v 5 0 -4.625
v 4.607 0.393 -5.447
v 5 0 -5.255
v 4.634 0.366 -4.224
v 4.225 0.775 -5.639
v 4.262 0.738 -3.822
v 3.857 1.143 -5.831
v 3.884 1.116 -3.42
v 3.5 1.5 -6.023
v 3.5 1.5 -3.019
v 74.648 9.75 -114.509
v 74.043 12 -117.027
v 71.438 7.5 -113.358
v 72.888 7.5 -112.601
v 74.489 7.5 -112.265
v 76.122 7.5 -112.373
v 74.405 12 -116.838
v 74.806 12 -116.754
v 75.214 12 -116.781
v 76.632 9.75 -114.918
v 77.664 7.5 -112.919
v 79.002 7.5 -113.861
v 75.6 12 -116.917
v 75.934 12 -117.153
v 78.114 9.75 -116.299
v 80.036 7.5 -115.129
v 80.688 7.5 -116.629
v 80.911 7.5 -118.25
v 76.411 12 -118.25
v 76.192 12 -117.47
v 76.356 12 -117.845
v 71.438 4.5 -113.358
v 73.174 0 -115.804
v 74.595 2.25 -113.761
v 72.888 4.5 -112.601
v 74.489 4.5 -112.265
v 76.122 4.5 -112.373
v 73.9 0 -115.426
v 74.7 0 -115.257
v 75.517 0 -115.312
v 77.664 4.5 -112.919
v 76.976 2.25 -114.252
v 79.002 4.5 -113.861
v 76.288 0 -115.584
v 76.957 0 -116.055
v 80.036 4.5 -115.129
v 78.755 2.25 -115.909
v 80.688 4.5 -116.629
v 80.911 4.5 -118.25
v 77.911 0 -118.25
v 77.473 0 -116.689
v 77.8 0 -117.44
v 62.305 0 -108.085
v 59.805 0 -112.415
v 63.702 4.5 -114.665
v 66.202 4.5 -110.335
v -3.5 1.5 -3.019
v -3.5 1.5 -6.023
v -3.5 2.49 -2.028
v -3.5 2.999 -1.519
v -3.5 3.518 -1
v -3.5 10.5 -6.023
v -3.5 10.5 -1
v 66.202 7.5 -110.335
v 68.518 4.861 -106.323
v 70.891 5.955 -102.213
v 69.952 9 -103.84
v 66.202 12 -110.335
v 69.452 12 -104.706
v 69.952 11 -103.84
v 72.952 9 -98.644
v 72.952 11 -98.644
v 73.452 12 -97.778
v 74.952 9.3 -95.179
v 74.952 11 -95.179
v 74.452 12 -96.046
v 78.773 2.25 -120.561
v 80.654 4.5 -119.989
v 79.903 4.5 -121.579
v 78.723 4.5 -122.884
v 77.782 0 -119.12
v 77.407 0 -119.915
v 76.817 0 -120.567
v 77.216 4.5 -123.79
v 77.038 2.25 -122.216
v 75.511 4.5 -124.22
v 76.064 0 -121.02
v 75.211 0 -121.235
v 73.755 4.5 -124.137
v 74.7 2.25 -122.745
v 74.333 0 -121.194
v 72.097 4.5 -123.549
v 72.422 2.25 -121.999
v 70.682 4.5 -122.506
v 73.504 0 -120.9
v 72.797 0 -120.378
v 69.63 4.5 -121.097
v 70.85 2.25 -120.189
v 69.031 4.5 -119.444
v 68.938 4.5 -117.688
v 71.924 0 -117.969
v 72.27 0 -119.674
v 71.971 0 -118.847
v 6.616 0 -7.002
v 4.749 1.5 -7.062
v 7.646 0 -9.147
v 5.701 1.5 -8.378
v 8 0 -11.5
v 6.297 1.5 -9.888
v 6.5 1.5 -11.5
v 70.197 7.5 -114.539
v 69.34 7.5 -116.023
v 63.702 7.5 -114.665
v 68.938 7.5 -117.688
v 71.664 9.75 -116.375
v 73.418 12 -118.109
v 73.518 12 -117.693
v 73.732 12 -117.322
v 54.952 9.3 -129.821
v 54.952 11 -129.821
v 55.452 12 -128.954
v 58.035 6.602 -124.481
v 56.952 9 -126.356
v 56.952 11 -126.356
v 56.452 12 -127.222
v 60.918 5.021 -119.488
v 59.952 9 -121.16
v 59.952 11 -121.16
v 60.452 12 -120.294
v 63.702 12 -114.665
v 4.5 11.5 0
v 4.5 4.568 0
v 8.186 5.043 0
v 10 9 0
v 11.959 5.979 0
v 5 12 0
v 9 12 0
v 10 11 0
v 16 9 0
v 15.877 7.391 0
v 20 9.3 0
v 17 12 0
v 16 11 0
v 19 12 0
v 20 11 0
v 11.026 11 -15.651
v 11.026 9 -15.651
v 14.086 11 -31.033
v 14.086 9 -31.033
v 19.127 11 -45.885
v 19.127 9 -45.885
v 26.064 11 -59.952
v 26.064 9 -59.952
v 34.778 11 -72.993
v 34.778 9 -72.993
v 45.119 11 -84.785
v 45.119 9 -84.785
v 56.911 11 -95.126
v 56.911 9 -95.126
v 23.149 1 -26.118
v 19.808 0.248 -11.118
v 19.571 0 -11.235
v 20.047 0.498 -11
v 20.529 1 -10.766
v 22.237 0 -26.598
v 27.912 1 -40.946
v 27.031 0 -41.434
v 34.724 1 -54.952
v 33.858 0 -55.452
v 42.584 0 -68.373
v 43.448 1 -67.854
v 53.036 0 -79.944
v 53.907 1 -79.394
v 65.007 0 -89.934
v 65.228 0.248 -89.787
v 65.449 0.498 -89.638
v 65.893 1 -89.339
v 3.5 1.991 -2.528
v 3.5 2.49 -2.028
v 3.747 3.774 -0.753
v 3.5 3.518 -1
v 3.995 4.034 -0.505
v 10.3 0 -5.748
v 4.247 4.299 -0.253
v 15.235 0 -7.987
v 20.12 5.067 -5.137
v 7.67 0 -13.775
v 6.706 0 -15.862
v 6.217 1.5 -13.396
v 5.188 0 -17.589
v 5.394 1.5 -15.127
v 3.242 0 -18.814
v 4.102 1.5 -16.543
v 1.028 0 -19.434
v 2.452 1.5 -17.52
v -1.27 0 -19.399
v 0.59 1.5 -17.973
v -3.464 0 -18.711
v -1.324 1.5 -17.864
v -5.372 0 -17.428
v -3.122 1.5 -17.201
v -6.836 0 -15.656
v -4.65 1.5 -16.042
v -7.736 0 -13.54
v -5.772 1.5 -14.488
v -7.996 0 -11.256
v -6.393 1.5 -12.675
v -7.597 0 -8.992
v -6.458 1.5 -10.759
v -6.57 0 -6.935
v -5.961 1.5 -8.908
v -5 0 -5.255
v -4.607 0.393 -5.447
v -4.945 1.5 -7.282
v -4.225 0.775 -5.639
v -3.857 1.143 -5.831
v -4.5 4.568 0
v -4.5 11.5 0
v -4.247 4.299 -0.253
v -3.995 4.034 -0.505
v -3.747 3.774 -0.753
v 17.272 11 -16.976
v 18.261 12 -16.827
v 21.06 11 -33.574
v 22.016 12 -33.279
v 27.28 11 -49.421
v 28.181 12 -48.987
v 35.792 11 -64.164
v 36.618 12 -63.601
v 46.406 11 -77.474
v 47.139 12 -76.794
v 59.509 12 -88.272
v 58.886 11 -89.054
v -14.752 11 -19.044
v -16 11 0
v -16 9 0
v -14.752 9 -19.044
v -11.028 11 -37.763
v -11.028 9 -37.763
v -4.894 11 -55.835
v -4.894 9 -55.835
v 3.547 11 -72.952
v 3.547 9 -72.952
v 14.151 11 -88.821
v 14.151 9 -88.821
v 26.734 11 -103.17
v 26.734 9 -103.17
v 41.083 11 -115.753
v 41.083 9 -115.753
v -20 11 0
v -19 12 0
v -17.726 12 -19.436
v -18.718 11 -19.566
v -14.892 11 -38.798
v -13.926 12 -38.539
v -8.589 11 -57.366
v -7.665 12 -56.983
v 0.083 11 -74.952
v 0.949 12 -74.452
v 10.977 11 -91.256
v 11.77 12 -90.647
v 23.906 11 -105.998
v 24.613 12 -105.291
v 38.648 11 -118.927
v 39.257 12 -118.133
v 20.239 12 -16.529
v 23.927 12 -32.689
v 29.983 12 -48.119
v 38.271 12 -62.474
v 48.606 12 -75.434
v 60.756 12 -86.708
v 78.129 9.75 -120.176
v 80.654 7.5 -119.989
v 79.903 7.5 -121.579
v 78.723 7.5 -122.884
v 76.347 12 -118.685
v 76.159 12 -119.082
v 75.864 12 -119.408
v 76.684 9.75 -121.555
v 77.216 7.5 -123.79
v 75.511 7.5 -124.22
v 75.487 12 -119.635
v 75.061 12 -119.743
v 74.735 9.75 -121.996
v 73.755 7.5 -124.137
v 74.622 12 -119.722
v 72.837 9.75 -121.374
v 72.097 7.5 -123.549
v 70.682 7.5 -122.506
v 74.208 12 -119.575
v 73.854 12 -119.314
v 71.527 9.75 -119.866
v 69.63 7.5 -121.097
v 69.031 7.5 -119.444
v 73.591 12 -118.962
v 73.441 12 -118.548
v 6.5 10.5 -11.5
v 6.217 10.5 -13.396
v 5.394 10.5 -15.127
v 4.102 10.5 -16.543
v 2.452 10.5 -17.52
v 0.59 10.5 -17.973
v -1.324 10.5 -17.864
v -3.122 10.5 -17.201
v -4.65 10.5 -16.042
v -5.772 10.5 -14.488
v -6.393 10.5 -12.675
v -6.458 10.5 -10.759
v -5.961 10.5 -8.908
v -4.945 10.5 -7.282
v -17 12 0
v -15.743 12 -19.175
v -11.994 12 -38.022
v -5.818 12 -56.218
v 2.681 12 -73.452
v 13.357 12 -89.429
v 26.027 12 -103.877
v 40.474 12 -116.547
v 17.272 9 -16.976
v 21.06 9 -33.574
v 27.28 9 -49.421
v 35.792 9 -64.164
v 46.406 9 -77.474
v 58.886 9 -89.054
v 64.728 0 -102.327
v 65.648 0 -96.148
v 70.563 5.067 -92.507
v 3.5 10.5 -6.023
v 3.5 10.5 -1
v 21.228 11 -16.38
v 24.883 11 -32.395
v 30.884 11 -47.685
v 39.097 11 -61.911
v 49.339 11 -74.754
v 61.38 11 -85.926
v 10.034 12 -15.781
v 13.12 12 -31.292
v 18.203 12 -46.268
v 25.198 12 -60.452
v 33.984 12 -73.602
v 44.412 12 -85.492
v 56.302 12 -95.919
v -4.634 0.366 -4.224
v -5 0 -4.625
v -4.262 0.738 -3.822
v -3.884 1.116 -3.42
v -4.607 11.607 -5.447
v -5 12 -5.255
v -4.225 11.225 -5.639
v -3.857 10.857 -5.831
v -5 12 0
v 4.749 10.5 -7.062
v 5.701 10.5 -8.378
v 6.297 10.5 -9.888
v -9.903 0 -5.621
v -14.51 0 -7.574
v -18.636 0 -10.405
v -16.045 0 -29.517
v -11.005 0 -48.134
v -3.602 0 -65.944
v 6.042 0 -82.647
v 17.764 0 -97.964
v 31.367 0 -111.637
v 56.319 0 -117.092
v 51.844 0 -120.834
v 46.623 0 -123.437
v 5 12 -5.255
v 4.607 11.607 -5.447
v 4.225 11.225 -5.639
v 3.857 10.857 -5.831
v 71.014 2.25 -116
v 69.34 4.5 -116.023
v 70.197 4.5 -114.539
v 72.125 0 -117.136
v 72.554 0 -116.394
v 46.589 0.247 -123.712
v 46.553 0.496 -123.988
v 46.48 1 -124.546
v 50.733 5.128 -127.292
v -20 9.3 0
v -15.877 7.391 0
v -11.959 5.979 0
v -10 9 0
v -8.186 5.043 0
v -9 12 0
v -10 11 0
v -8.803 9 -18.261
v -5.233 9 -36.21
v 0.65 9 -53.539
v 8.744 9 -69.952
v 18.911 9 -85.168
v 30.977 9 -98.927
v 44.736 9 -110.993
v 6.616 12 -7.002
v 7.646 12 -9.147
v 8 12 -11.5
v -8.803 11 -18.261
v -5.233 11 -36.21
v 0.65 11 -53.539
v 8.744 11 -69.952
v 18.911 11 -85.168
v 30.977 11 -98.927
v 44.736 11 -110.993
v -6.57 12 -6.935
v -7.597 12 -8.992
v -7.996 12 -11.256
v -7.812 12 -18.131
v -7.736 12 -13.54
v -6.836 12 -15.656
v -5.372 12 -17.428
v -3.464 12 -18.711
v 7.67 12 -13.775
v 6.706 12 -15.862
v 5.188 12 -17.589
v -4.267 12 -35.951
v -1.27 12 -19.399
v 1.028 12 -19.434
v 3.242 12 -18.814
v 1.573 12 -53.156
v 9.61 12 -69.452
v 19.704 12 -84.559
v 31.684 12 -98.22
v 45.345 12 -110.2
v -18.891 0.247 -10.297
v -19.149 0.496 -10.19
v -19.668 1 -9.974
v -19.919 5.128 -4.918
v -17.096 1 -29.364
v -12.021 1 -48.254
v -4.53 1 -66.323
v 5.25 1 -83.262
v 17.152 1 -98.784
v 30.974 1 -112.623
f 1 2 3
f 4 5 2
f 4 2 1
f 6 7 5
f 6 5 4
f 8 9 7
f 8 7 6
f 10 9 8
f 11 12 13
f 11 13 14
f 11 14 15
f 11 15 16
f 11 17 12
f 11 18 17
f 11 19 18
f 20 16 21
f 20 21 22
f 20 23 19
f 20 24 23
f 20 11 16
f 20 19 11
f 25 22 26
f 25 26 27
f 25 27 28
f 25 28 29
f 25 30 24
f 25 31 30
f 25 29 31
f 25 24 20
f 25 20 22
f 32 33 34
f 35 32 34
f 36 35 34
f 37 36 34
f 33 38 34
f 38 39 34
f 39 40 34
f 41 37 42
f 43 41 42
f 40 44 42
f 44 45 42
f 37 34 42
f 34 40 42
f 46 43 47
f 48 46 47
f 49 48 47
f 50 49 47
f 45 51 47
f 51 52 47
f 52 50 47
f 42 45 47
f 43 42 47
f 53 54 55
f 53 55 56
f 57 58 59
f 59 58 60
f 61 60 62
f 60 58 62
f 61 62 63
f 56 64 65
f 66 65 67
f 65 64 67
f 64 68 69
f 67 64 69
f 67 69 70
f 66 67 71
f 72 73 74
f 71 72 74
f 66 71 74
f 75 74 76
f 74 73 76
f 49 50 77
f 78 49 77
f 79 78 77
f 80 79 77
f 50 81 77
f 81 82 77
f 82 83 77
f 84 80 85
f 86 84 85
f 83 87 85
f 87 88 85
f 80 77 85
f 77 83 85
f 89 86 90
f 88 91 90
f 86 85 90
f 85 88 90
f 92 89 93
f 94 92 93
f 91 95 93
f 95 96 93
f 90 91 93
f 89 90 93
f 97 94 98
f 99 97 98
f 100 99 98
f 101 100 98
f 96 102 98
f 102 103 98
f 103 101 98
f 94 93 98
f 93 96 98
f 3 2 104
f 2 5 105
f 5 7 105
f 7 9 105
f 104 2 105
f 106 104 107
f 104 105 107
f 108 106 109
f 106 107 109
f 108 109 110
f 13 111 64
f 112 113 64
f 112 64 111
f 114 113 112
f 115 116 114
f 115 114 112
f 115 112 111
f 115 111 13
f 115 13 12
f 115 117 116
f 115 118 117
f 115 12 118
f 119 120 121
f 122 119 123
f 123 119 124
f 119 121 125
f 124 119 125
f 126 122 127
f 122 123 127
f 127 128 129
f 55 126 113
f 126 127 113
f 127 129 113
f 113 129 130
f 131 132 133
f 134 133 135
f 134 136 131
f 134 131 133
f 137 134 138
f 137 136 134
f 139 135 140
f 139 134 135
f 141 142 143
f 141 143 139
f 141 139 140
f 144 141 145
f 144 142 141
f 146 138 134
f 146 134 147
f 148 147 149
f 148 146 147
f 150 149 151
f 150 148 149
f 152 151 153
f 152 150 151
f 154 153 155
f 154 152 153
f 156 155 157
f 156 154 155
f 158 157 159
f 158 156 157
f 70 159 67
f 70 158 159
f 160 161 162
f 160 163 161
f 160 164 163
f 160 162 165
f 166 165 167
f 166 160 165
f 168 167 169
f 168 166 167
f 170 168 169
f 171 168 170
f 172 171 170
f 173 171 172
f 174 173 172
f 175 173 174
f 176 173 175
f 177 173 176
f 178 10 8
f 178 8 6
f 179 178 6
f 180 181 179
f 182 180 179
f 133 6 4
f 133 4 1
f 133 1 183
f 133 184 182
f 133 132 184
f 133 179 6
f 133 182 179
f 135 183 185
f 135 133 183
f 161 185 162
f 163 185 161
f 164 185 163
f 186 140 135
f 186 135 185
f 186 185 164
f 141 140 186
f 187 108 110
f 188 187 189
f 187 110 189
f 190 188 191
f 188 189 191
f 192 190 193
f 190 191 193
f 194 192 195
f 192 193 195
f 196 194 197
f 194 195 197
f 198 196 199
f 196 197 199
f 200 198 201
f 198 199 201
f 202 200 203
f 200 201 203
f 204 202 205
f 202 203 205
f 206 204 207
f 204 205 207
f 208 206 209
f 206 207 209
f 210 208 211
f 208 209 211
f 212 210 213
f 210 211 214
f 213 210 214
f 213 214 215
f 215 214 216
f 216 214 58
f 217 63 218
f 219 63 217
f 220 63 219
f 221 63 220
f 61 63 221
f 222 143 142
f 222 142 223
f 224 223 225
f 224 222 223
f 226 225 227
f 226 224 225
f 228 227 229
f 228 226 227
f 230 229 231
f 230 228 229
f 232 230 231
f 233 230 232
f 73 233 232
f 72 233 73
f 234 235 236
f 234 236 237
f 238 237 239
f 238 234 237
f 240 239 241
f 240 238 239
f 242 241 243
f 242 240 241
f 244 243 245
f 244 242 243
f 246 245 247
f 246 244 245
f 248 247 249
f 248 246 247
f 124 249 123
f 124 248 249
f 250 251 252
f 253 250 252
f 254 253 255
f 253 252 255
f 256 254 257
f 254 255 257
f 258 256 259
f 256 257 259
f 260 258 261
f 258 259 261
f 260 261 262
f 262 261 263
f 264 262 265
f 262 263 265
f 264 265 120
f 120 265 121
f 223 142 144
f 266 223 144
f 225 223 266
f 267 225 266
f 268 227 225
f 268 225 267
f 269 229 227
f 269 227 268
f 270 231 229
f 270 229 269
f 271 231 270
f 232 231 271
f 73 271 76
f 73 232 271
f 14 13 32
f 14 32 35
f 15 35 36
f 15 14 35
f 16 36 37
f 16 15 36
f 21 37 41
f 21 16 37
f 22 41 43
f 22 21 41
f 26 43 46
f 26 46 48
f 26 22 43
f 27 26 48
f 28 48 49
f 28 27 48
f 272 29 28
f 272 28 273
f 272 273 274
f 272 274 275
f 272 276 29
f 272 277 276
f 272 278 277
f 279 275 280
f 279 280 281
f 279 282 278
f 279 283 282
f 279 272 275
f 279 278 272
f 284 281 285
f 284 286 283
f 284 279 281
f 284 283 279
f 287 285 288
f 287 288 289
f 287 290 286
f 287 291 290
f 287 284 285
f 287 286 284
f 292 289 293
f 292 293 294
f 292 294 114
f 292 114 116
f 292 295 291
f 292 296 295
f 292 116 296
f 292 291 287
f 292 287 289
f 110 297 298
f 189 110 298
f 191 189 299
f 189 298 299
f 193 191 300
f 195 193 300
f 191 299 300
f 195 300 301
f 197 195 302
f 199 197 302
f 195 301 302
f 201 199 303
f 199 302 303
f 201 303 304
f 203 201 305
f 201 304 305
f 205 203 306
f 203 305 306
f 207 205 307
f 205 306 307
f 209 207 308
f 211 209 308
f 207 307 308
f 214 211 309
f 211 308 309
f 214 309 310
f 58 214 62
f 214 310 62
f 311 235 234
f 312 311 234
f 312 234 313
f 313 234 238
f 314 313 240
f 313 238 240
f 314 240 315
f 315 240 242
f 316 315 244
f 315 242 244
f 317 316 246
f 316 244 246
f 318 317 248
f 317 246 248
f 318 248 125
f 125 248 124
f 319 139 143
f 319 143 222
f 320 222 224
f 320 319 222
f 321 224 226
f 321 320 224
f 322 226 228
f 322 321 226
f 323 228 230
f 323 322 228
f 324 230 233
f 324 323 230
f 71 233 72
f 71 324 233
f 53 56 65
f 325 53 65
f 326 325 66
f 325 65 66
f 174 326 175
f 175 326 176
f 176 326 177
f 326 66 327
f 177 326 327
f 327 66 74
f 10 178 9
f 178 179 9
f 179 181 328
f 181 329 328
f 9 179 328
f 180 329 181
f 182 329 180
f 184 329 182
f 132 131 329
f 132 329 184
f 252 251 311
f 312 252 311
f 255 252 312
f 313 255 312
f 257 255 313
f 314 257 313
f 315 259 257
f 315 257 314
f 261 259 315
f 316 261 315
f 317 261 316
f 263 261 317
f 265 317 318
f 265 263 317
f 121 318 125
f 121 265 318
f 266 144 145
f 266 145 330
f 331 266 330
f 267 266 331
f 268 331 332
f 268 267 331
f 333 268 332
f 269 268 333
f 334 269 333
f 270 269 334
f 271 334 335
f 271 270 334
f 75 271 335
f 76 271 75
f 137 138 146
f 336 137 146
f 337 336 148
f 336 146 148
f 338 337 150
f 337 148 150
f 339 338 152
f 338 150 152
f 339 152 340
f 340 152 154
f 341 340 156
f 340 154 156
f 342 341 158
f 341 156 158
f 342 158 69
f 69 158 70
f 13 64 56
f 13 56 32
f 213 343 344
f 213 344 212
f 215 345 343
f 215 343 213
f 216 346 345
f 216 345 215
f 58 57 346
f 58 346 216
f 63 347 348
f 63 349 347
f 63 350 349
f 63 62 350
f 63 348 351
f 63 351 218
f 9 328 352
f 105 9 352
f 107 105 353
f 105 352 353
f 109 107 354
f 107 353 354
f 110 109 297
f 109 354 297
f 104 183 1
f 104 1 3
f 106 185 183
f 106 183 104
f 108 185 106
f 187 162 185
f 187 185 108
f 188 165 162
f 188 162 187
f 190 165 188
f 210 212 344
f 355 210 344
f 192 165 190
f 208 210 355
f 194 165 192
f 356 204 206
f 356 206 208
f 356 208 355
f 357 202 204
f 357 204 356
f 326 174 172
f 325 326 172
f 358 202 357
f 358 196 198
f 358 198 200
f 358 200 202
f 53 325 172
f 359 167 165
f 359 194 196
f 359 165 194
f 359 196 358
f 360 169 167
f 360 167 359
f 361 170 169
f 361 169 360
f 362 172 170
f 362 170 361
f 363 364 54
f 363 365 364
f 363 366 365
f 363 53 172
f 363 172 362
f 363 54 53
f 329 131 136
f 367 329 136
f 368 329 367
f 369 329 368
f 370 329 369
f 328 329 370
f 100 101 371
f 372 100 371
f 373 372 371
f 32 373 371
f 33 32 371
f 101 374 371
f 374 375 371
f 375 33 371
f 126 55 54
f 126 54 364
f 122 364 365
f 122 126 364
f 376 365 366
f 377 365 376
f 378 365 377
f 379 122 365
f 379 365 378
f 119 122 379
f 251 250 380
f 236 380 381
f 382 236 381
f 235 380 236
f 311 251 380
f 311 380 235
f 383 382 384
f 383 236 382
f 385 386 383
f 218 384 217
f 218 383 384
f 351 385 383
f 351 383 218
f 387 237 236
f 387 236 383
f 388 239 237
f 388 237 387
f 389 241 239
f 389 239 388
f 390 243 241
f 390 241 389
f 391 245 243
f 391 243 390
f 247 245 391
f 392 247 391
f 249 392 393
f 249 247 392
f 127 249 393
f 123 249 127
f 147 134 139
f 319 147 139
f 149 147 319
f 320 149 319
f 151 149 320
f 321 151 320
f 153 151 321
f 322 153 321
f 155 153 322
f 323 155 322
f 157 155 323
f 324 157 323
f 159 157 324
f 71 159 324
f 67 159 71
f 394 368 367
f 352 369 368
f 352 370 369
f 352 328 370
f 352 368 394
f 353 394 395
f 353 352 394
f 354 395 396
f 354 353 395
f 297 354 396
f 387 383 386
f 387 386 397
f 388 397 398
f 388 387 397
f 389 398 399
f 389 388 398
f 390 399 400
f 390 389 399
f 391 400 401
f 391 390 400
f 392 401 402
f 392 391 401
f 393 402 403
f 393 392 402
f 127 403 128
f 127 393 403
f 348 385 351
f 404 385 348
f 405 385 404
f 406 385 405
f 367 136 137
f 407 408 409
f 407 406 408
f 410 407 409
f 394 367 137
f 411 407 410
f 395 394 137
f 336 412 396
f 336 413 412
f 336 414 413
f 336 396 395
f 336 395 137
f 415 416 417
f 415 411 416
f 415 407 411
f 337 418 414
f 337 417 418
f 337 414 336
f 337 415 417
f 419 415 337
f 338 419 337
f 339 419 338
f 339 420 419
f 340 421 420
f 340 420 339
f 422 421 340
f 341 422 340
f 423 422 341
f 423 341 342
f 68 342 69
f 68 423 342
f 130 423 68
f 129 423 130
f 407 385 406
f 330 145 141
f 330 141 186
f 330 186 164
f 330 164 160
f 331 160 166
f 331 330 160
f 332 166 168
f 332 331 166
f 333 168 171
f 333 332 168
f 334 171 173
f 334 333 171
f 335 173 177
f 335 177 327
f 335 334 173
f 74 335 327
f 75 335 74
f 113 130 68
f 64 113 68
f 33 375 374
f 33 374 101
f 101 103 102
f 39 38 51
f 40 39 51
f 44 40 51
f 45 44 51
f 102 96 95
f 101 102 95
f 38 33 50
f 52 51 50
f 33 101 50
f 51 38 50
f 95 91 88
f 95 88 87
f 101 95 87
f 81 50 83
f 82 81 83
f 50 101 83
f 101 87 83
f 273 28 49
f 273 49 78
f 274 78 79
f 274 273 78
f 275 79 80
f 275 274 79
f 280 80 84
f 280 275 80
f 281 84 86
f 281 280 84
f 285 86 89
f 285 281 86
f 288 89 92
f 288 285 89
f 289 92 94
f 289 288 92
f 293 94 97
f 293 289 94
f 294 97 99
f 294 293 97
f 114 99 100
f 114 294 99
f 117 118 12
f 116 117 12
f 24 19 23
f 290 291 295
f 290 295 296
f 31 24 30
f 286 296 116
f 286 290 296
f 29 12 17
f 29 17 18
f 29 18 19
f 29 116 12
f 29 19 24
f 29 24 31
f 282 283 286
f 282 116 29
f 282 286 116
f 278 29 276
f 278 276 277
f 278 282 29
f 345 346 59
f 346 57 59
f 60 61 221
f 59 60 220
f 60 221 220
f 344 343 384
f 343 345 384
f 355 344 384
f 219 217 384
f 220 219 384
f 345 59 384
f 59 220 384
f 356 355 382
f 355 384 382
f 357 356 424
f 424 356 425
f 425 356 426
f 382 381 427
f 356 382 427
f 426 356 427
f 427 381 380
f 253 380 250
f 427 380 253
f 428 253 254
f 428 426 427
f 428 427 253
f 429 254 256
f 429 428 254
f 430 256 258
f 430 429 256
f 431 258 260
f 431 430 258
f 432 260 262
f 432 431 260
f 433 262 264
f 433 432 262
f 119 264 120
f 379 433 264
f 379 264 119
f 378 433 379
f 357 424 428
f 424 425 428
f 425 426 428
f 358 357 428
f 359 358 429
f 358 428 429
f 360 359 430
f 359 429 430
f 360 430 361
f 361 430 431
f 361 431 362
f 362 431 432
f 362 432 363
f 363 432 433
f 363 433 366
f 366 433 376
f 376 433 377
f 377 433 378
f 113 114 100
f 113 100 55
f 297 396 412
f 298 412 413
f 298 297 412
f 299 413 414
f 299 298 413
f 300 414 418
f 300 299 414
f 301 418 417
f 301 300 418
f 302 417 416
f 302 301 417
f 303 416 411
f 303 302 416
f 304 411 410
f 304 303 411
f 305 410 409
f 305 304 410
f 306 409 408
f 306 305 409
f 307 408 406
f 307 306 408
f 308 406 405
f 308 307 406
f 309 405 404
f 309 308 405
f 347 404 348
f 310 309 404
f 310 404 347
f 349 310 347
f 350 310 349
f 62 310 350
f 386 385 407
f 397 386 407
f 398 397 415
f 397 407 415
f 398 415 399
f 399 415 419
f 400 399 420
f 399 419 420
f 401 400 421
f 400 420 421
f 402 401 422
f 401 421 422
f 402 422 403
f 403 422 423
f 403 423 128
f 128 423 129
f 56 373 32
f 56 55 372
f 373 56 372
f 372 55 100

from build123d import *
from build123d.topology import SkipClean

# Parameters (mm, degrees)
REVOLVE1_ANGLE       = 60
CUT_EXTRUDE1_DEPTH   = 151.38335158
BOSS_EXTRUDE1_DEPTH  = 12
BOSS_EXTRUDE2_DEPTH  = 7.5
CUT_EXTRUDE2_DEPTH   = 4.5
CHAMFER2_SIZE        = 4.5
CHAMFER5_SIZE2       = 3
CHAMFER5_SIZE        = 4.5
CHAMFER3_SIZE        = 1.5
CUT_REVOLVE1_ANGLE   = 90
CHAMFER4_SIZE        = 4.5
MIRROR4_COPY_1_ANGLE = 90
CHAMFER1_SIZE        = 1


with BuildPart() as part:
    # Sketch2 → Revolve1 (revolve)
    with BuildSketch(Plane.XY):
        Polygon((-16, 12), (-20, 12), (-20, 0), (20, 0), (20, 12), (16, 12), (16, 9), (10, 9), (10, 12), (-10, 12), (-10, 9), (-16, 9), align=None)
    revolve(axis=Axis((129.9038106, 0, 0), (0, -1, 0)), revolution_arc=REVOLVE1_ANGLE)

    # Sketch3 → Cut-Extrude1 (cut, through all)
    with BuildSketch(Plane(origin=(0, 12, 0), x_dir=(1, 0, 0), z_dir=(0, 1, 0))):
        with BuildLine():
            ThreePointArc((6.5, 11.5), (-3.122498999, 17.200877125), (-3.5, 6.022774425))
            Line((-3.5, 6.022774425), (-3.5, 11.5))
            Line((-3.5, 11.5), (3.5, 11.5))
            Line((3.5, 11.5), (3.5, 6.022774425))
            ThreePointArc((3.5, 6.022774425), (5.700877125, 8.377501001), (6.5, 11.5))
        make_face()
        with BuildLine():
            Line((-3.5, 11.5), (-3.5, 6.022774425))
            ThreePointArc((-3.5, 6.022774425), (0, 5), (3.5, 6.022774425))
            Line((3.5, 6.022774425), (3.5, 11.5))
            Line((3.5, 11.5), (-3.5, 11.5))
        make_face()
        with BuildLine():
            Line((-3.5, 6.022774425), (-3.5, 0))
            Line((-3.5, 0), (3.5, 0))
            Line((3.5, 0), (3.5, 6.022774425))
            ThreePointArc((3.5, 6.022774425), (0, 5), (-3.5, 6.022774425))
        make_face()
    extrude(amount=-CUT_EXTRUDE1_DEPTH, mode=Mode.SUBTRACT)



with BuildPart() as body_2:
    # Sketch4 → Boss-Extrude1 (new body)
    with BuildSketch(Plane(origin=(0, 12, 0), x_dir=(1, 0, 0), z_dir=(0, 1, 0))):
        with BuildLine():
            ThreePointArc((68.937586537, 117.687885509), (69.715045021, 115.250000028), (71.437586537, 113.35775849))
            Line((71.437586537, 113.35775849), (76.161197444, 116.084936519))
            Line((76.161197444, 116.084936519), (73.661197444, 120.415063537))
            Line((73.661197444, 120.415063537), (68.937586537, 117.687885509))
        make_face()
        with BuildLine():
            Line((76.161197444, 116.084936519), (71.437586537, 113.35775849))
            ThreePointArc((71.437586537, 113.35775849), (77.66422619, 112.918880753), (80.911197444, 118.250000028))
            ThreePointArc((80.911197444, 118.250000028), (74.629830638, 124.243399124), (68.937586537, 117.687885509))
            Line((68.937586537, 117.687885509), (73.661197444, 120.415063537))
            Line((73.661197444, 120.415063537), (76.161197444, 116.084936519))
        make_face()
    extrude(amount=-BOSS_EXTRUDE1_DEPTH)


with BuildPart() as part_1:
    add(part.part)

    add(body_2.part)  # Boss-Extrude2 merges body 2
    # Sketch4<3> → Boss-Extrude2 (add)
    with BuildSketch(Plane(origin=(0, 12, 0), x_dir=(1, 0, 0), z_dir=(0, 1, 0))):
        with BuildLine():
            Line((63.7019053, 114.665063537), (66.2019053, 110.334936519))
            Line((66.2019053, 110.334936519), (71.437586537, 113.35775849))
            ThreePointArc((71.437586537, 113.35775849), (69.715045021, 115.250000028), (68.937586537, 117.687885509))
            Line((68.937586537, 117.687885509), (63.7019053, 114.665063537))
        make_face()
    extrude(amount=-BOSS_EXTRUDE2_DEPTH)

    # Sketch4<5> → Cut-Extrude2 (cut)
    with SkipClean():  # the faces are left unmerged after this step: merging them gives an invalid solid
        with BuildSketch(Plane(origin=(0, 12, 0), x_dir=(1, 0, 0), z_dir=(0, 1, 0))):
            with BuildLine():
                Line((63.7019053, 114.665063537), (66.2019053, 110.334936519))
                Line((66.2019053, 110.334936519), (71.437586537, 113.35775849))
                ThreePointArc((71.437586537, 113.35775849), (69.715045021, 115.250000028), (68.937586537, 117.687885509))
                Line((68.937586537, 117.687885509), (63.7019053, 114.665063537))
            make_face()
        extrude(amount=-CUT_EXTRUDE2_DEPTH, mode=Mode.SUBTRACT)

    # Chamfer2
    chamfer2_edges = [part_1.edges().sort_by_distance(p)[0] for p in [
        (80.107349866, 12, -121.250000028),
    ]]
    chamfer(chamfer2_edges, length=CHAMFER2_SIZE - 0.0001)  # a hair under: the kernel refuses the full size

    # Chamfer5
    chamfer5_edges = [part_1.edges().sort_by_distance(p)[0] for p in [
        (80.88480835, 0, -118.812114547),
    ]]
    chamfer5_side = [part_1.faces().sort_by_distance(p)[0] for p in [
        (80.88480835, 0.06, -118.812114547),
    ]]
    chamfer(chamfer5_edges, length=CHAMFER5_SIZE - 0.0001, length2=CHAMFER5_SIZE2 - 0.0001, reference=chamfer5_side[0])  # a hair under: the kernel refuses the full size

    # Chamfer3
    chamfer3_edges = [part_1.edges().sort_by_distance(p)[0] for p in [
        (0, 0, -18),
        (3.5, 0, -3.011387212),
        (-3.5, 12, -3.011387212),
        (-3.5, 0, -3.011387212),
        (0, 12, -18),
        (3.5, 12, -3.011387212),
    ]]
    chamfer(chamfer3_edges, length=CHAMFER3_SIZE)

    # Sketch17 → Cut-Revolve1 (revolve, cut)
    with BuildSketch(Plane(origin=(-33.72595265, 0, -58.415063523), x_dir=(-0.8660254037844378, 0, 0.5000000000000017), z_dir=(-0.5000000000000016, -1.1564823173178769e-15, -0.8660254037844377))):
        Polygon((-118.545643971, 10.545643943), (-118.545643971, 0), (-108.000000028, 0), align=None)
    cut_revolve1 = revolve(axis=Axis((38.154155888, -1.265151723, -99.915063537), (0, 1, 0)), revolution_arc=CUT_REVOLVE1_ANGLE, mode=Mode.SUBTRACT)

    # Mirror1: Cut-Revolve1 across plane
    add(cut_revolve1.mirror(Plane(origin=(-32.47595265, 0, -56.250000014), x_dir=(-0.866025403784439, -2.003086131649547e-15, 0.49999999999999933), z_dir=(-0.4999999999999994, -1.1564823173178701e-15, -0.866025403784439))), mode=Mode.SUBTRACT)

    # Chamfer4
    chamfer4_edges = [part_1.edges().sort_by_distance(p)[0] for p in [
        (64.9519053, 0, -112.500000028),
    ]]
    chamfer(chamfer4_edges, length=CHAMFER4_SIZE - 0.0001)  # a hair under: the kernel refuses the full size

    # Mirror4: Cut-Revolve1 across plane
    add(cut_revolve1.mirror(Plane(origin=(32.47595265, 0, -56.250000014), x_dir=(0.8660254037844382, 0, 0.5000000000000009), z_dir=(0.5000000000000009, 0, -0.8660254037844382))), mode=Mode.SUBTRACT)

    # Mirror4 copy 1 sketch → Mirror4 copy 1 (revolve, cut)
    with BuildSketch(Plane(origin=(2.5, 0, -112.500000028), x_dir=(0, 0, -1), z_dir=(1, 0, 0))):
        Polygon((-118.545643971, 10.545643943), (-118.545643971, 0), (-108.000000028, 0), align=None)
    revolve(axis=Axis((2.5, -1.265151723, -29.5), (0, 1, 0)), revolution_arc=MIRROR4_COPY_1_ANGLE, mode=Mode.SUBTRACT)

    # Chamfer1
    chamfer1_edges = [part_1.edges().sort_by_distance(p)[0] for p in [
        (0.083302496, 0, -74.9519053),
        (34.724318648, 0, -54.9519053),
        (-3.5, 7.508472143, 0),
        (3.5, 7.508472143, 0),
        (3.547404111, 12, -72.9519053),
        (8.743556534, 12, -69.9519053),
        (26.06406461, 12, -59.9519053),
        (31.260217033, 12, -56.9519053),
        (34.724318648, 12, -54.9519053),
        (0.083302496, 12, -74.9519053),
    ]]
    chamfer(chamfer1_edges, length=CHAMFER1_SIZE)


solid = part_1.part
